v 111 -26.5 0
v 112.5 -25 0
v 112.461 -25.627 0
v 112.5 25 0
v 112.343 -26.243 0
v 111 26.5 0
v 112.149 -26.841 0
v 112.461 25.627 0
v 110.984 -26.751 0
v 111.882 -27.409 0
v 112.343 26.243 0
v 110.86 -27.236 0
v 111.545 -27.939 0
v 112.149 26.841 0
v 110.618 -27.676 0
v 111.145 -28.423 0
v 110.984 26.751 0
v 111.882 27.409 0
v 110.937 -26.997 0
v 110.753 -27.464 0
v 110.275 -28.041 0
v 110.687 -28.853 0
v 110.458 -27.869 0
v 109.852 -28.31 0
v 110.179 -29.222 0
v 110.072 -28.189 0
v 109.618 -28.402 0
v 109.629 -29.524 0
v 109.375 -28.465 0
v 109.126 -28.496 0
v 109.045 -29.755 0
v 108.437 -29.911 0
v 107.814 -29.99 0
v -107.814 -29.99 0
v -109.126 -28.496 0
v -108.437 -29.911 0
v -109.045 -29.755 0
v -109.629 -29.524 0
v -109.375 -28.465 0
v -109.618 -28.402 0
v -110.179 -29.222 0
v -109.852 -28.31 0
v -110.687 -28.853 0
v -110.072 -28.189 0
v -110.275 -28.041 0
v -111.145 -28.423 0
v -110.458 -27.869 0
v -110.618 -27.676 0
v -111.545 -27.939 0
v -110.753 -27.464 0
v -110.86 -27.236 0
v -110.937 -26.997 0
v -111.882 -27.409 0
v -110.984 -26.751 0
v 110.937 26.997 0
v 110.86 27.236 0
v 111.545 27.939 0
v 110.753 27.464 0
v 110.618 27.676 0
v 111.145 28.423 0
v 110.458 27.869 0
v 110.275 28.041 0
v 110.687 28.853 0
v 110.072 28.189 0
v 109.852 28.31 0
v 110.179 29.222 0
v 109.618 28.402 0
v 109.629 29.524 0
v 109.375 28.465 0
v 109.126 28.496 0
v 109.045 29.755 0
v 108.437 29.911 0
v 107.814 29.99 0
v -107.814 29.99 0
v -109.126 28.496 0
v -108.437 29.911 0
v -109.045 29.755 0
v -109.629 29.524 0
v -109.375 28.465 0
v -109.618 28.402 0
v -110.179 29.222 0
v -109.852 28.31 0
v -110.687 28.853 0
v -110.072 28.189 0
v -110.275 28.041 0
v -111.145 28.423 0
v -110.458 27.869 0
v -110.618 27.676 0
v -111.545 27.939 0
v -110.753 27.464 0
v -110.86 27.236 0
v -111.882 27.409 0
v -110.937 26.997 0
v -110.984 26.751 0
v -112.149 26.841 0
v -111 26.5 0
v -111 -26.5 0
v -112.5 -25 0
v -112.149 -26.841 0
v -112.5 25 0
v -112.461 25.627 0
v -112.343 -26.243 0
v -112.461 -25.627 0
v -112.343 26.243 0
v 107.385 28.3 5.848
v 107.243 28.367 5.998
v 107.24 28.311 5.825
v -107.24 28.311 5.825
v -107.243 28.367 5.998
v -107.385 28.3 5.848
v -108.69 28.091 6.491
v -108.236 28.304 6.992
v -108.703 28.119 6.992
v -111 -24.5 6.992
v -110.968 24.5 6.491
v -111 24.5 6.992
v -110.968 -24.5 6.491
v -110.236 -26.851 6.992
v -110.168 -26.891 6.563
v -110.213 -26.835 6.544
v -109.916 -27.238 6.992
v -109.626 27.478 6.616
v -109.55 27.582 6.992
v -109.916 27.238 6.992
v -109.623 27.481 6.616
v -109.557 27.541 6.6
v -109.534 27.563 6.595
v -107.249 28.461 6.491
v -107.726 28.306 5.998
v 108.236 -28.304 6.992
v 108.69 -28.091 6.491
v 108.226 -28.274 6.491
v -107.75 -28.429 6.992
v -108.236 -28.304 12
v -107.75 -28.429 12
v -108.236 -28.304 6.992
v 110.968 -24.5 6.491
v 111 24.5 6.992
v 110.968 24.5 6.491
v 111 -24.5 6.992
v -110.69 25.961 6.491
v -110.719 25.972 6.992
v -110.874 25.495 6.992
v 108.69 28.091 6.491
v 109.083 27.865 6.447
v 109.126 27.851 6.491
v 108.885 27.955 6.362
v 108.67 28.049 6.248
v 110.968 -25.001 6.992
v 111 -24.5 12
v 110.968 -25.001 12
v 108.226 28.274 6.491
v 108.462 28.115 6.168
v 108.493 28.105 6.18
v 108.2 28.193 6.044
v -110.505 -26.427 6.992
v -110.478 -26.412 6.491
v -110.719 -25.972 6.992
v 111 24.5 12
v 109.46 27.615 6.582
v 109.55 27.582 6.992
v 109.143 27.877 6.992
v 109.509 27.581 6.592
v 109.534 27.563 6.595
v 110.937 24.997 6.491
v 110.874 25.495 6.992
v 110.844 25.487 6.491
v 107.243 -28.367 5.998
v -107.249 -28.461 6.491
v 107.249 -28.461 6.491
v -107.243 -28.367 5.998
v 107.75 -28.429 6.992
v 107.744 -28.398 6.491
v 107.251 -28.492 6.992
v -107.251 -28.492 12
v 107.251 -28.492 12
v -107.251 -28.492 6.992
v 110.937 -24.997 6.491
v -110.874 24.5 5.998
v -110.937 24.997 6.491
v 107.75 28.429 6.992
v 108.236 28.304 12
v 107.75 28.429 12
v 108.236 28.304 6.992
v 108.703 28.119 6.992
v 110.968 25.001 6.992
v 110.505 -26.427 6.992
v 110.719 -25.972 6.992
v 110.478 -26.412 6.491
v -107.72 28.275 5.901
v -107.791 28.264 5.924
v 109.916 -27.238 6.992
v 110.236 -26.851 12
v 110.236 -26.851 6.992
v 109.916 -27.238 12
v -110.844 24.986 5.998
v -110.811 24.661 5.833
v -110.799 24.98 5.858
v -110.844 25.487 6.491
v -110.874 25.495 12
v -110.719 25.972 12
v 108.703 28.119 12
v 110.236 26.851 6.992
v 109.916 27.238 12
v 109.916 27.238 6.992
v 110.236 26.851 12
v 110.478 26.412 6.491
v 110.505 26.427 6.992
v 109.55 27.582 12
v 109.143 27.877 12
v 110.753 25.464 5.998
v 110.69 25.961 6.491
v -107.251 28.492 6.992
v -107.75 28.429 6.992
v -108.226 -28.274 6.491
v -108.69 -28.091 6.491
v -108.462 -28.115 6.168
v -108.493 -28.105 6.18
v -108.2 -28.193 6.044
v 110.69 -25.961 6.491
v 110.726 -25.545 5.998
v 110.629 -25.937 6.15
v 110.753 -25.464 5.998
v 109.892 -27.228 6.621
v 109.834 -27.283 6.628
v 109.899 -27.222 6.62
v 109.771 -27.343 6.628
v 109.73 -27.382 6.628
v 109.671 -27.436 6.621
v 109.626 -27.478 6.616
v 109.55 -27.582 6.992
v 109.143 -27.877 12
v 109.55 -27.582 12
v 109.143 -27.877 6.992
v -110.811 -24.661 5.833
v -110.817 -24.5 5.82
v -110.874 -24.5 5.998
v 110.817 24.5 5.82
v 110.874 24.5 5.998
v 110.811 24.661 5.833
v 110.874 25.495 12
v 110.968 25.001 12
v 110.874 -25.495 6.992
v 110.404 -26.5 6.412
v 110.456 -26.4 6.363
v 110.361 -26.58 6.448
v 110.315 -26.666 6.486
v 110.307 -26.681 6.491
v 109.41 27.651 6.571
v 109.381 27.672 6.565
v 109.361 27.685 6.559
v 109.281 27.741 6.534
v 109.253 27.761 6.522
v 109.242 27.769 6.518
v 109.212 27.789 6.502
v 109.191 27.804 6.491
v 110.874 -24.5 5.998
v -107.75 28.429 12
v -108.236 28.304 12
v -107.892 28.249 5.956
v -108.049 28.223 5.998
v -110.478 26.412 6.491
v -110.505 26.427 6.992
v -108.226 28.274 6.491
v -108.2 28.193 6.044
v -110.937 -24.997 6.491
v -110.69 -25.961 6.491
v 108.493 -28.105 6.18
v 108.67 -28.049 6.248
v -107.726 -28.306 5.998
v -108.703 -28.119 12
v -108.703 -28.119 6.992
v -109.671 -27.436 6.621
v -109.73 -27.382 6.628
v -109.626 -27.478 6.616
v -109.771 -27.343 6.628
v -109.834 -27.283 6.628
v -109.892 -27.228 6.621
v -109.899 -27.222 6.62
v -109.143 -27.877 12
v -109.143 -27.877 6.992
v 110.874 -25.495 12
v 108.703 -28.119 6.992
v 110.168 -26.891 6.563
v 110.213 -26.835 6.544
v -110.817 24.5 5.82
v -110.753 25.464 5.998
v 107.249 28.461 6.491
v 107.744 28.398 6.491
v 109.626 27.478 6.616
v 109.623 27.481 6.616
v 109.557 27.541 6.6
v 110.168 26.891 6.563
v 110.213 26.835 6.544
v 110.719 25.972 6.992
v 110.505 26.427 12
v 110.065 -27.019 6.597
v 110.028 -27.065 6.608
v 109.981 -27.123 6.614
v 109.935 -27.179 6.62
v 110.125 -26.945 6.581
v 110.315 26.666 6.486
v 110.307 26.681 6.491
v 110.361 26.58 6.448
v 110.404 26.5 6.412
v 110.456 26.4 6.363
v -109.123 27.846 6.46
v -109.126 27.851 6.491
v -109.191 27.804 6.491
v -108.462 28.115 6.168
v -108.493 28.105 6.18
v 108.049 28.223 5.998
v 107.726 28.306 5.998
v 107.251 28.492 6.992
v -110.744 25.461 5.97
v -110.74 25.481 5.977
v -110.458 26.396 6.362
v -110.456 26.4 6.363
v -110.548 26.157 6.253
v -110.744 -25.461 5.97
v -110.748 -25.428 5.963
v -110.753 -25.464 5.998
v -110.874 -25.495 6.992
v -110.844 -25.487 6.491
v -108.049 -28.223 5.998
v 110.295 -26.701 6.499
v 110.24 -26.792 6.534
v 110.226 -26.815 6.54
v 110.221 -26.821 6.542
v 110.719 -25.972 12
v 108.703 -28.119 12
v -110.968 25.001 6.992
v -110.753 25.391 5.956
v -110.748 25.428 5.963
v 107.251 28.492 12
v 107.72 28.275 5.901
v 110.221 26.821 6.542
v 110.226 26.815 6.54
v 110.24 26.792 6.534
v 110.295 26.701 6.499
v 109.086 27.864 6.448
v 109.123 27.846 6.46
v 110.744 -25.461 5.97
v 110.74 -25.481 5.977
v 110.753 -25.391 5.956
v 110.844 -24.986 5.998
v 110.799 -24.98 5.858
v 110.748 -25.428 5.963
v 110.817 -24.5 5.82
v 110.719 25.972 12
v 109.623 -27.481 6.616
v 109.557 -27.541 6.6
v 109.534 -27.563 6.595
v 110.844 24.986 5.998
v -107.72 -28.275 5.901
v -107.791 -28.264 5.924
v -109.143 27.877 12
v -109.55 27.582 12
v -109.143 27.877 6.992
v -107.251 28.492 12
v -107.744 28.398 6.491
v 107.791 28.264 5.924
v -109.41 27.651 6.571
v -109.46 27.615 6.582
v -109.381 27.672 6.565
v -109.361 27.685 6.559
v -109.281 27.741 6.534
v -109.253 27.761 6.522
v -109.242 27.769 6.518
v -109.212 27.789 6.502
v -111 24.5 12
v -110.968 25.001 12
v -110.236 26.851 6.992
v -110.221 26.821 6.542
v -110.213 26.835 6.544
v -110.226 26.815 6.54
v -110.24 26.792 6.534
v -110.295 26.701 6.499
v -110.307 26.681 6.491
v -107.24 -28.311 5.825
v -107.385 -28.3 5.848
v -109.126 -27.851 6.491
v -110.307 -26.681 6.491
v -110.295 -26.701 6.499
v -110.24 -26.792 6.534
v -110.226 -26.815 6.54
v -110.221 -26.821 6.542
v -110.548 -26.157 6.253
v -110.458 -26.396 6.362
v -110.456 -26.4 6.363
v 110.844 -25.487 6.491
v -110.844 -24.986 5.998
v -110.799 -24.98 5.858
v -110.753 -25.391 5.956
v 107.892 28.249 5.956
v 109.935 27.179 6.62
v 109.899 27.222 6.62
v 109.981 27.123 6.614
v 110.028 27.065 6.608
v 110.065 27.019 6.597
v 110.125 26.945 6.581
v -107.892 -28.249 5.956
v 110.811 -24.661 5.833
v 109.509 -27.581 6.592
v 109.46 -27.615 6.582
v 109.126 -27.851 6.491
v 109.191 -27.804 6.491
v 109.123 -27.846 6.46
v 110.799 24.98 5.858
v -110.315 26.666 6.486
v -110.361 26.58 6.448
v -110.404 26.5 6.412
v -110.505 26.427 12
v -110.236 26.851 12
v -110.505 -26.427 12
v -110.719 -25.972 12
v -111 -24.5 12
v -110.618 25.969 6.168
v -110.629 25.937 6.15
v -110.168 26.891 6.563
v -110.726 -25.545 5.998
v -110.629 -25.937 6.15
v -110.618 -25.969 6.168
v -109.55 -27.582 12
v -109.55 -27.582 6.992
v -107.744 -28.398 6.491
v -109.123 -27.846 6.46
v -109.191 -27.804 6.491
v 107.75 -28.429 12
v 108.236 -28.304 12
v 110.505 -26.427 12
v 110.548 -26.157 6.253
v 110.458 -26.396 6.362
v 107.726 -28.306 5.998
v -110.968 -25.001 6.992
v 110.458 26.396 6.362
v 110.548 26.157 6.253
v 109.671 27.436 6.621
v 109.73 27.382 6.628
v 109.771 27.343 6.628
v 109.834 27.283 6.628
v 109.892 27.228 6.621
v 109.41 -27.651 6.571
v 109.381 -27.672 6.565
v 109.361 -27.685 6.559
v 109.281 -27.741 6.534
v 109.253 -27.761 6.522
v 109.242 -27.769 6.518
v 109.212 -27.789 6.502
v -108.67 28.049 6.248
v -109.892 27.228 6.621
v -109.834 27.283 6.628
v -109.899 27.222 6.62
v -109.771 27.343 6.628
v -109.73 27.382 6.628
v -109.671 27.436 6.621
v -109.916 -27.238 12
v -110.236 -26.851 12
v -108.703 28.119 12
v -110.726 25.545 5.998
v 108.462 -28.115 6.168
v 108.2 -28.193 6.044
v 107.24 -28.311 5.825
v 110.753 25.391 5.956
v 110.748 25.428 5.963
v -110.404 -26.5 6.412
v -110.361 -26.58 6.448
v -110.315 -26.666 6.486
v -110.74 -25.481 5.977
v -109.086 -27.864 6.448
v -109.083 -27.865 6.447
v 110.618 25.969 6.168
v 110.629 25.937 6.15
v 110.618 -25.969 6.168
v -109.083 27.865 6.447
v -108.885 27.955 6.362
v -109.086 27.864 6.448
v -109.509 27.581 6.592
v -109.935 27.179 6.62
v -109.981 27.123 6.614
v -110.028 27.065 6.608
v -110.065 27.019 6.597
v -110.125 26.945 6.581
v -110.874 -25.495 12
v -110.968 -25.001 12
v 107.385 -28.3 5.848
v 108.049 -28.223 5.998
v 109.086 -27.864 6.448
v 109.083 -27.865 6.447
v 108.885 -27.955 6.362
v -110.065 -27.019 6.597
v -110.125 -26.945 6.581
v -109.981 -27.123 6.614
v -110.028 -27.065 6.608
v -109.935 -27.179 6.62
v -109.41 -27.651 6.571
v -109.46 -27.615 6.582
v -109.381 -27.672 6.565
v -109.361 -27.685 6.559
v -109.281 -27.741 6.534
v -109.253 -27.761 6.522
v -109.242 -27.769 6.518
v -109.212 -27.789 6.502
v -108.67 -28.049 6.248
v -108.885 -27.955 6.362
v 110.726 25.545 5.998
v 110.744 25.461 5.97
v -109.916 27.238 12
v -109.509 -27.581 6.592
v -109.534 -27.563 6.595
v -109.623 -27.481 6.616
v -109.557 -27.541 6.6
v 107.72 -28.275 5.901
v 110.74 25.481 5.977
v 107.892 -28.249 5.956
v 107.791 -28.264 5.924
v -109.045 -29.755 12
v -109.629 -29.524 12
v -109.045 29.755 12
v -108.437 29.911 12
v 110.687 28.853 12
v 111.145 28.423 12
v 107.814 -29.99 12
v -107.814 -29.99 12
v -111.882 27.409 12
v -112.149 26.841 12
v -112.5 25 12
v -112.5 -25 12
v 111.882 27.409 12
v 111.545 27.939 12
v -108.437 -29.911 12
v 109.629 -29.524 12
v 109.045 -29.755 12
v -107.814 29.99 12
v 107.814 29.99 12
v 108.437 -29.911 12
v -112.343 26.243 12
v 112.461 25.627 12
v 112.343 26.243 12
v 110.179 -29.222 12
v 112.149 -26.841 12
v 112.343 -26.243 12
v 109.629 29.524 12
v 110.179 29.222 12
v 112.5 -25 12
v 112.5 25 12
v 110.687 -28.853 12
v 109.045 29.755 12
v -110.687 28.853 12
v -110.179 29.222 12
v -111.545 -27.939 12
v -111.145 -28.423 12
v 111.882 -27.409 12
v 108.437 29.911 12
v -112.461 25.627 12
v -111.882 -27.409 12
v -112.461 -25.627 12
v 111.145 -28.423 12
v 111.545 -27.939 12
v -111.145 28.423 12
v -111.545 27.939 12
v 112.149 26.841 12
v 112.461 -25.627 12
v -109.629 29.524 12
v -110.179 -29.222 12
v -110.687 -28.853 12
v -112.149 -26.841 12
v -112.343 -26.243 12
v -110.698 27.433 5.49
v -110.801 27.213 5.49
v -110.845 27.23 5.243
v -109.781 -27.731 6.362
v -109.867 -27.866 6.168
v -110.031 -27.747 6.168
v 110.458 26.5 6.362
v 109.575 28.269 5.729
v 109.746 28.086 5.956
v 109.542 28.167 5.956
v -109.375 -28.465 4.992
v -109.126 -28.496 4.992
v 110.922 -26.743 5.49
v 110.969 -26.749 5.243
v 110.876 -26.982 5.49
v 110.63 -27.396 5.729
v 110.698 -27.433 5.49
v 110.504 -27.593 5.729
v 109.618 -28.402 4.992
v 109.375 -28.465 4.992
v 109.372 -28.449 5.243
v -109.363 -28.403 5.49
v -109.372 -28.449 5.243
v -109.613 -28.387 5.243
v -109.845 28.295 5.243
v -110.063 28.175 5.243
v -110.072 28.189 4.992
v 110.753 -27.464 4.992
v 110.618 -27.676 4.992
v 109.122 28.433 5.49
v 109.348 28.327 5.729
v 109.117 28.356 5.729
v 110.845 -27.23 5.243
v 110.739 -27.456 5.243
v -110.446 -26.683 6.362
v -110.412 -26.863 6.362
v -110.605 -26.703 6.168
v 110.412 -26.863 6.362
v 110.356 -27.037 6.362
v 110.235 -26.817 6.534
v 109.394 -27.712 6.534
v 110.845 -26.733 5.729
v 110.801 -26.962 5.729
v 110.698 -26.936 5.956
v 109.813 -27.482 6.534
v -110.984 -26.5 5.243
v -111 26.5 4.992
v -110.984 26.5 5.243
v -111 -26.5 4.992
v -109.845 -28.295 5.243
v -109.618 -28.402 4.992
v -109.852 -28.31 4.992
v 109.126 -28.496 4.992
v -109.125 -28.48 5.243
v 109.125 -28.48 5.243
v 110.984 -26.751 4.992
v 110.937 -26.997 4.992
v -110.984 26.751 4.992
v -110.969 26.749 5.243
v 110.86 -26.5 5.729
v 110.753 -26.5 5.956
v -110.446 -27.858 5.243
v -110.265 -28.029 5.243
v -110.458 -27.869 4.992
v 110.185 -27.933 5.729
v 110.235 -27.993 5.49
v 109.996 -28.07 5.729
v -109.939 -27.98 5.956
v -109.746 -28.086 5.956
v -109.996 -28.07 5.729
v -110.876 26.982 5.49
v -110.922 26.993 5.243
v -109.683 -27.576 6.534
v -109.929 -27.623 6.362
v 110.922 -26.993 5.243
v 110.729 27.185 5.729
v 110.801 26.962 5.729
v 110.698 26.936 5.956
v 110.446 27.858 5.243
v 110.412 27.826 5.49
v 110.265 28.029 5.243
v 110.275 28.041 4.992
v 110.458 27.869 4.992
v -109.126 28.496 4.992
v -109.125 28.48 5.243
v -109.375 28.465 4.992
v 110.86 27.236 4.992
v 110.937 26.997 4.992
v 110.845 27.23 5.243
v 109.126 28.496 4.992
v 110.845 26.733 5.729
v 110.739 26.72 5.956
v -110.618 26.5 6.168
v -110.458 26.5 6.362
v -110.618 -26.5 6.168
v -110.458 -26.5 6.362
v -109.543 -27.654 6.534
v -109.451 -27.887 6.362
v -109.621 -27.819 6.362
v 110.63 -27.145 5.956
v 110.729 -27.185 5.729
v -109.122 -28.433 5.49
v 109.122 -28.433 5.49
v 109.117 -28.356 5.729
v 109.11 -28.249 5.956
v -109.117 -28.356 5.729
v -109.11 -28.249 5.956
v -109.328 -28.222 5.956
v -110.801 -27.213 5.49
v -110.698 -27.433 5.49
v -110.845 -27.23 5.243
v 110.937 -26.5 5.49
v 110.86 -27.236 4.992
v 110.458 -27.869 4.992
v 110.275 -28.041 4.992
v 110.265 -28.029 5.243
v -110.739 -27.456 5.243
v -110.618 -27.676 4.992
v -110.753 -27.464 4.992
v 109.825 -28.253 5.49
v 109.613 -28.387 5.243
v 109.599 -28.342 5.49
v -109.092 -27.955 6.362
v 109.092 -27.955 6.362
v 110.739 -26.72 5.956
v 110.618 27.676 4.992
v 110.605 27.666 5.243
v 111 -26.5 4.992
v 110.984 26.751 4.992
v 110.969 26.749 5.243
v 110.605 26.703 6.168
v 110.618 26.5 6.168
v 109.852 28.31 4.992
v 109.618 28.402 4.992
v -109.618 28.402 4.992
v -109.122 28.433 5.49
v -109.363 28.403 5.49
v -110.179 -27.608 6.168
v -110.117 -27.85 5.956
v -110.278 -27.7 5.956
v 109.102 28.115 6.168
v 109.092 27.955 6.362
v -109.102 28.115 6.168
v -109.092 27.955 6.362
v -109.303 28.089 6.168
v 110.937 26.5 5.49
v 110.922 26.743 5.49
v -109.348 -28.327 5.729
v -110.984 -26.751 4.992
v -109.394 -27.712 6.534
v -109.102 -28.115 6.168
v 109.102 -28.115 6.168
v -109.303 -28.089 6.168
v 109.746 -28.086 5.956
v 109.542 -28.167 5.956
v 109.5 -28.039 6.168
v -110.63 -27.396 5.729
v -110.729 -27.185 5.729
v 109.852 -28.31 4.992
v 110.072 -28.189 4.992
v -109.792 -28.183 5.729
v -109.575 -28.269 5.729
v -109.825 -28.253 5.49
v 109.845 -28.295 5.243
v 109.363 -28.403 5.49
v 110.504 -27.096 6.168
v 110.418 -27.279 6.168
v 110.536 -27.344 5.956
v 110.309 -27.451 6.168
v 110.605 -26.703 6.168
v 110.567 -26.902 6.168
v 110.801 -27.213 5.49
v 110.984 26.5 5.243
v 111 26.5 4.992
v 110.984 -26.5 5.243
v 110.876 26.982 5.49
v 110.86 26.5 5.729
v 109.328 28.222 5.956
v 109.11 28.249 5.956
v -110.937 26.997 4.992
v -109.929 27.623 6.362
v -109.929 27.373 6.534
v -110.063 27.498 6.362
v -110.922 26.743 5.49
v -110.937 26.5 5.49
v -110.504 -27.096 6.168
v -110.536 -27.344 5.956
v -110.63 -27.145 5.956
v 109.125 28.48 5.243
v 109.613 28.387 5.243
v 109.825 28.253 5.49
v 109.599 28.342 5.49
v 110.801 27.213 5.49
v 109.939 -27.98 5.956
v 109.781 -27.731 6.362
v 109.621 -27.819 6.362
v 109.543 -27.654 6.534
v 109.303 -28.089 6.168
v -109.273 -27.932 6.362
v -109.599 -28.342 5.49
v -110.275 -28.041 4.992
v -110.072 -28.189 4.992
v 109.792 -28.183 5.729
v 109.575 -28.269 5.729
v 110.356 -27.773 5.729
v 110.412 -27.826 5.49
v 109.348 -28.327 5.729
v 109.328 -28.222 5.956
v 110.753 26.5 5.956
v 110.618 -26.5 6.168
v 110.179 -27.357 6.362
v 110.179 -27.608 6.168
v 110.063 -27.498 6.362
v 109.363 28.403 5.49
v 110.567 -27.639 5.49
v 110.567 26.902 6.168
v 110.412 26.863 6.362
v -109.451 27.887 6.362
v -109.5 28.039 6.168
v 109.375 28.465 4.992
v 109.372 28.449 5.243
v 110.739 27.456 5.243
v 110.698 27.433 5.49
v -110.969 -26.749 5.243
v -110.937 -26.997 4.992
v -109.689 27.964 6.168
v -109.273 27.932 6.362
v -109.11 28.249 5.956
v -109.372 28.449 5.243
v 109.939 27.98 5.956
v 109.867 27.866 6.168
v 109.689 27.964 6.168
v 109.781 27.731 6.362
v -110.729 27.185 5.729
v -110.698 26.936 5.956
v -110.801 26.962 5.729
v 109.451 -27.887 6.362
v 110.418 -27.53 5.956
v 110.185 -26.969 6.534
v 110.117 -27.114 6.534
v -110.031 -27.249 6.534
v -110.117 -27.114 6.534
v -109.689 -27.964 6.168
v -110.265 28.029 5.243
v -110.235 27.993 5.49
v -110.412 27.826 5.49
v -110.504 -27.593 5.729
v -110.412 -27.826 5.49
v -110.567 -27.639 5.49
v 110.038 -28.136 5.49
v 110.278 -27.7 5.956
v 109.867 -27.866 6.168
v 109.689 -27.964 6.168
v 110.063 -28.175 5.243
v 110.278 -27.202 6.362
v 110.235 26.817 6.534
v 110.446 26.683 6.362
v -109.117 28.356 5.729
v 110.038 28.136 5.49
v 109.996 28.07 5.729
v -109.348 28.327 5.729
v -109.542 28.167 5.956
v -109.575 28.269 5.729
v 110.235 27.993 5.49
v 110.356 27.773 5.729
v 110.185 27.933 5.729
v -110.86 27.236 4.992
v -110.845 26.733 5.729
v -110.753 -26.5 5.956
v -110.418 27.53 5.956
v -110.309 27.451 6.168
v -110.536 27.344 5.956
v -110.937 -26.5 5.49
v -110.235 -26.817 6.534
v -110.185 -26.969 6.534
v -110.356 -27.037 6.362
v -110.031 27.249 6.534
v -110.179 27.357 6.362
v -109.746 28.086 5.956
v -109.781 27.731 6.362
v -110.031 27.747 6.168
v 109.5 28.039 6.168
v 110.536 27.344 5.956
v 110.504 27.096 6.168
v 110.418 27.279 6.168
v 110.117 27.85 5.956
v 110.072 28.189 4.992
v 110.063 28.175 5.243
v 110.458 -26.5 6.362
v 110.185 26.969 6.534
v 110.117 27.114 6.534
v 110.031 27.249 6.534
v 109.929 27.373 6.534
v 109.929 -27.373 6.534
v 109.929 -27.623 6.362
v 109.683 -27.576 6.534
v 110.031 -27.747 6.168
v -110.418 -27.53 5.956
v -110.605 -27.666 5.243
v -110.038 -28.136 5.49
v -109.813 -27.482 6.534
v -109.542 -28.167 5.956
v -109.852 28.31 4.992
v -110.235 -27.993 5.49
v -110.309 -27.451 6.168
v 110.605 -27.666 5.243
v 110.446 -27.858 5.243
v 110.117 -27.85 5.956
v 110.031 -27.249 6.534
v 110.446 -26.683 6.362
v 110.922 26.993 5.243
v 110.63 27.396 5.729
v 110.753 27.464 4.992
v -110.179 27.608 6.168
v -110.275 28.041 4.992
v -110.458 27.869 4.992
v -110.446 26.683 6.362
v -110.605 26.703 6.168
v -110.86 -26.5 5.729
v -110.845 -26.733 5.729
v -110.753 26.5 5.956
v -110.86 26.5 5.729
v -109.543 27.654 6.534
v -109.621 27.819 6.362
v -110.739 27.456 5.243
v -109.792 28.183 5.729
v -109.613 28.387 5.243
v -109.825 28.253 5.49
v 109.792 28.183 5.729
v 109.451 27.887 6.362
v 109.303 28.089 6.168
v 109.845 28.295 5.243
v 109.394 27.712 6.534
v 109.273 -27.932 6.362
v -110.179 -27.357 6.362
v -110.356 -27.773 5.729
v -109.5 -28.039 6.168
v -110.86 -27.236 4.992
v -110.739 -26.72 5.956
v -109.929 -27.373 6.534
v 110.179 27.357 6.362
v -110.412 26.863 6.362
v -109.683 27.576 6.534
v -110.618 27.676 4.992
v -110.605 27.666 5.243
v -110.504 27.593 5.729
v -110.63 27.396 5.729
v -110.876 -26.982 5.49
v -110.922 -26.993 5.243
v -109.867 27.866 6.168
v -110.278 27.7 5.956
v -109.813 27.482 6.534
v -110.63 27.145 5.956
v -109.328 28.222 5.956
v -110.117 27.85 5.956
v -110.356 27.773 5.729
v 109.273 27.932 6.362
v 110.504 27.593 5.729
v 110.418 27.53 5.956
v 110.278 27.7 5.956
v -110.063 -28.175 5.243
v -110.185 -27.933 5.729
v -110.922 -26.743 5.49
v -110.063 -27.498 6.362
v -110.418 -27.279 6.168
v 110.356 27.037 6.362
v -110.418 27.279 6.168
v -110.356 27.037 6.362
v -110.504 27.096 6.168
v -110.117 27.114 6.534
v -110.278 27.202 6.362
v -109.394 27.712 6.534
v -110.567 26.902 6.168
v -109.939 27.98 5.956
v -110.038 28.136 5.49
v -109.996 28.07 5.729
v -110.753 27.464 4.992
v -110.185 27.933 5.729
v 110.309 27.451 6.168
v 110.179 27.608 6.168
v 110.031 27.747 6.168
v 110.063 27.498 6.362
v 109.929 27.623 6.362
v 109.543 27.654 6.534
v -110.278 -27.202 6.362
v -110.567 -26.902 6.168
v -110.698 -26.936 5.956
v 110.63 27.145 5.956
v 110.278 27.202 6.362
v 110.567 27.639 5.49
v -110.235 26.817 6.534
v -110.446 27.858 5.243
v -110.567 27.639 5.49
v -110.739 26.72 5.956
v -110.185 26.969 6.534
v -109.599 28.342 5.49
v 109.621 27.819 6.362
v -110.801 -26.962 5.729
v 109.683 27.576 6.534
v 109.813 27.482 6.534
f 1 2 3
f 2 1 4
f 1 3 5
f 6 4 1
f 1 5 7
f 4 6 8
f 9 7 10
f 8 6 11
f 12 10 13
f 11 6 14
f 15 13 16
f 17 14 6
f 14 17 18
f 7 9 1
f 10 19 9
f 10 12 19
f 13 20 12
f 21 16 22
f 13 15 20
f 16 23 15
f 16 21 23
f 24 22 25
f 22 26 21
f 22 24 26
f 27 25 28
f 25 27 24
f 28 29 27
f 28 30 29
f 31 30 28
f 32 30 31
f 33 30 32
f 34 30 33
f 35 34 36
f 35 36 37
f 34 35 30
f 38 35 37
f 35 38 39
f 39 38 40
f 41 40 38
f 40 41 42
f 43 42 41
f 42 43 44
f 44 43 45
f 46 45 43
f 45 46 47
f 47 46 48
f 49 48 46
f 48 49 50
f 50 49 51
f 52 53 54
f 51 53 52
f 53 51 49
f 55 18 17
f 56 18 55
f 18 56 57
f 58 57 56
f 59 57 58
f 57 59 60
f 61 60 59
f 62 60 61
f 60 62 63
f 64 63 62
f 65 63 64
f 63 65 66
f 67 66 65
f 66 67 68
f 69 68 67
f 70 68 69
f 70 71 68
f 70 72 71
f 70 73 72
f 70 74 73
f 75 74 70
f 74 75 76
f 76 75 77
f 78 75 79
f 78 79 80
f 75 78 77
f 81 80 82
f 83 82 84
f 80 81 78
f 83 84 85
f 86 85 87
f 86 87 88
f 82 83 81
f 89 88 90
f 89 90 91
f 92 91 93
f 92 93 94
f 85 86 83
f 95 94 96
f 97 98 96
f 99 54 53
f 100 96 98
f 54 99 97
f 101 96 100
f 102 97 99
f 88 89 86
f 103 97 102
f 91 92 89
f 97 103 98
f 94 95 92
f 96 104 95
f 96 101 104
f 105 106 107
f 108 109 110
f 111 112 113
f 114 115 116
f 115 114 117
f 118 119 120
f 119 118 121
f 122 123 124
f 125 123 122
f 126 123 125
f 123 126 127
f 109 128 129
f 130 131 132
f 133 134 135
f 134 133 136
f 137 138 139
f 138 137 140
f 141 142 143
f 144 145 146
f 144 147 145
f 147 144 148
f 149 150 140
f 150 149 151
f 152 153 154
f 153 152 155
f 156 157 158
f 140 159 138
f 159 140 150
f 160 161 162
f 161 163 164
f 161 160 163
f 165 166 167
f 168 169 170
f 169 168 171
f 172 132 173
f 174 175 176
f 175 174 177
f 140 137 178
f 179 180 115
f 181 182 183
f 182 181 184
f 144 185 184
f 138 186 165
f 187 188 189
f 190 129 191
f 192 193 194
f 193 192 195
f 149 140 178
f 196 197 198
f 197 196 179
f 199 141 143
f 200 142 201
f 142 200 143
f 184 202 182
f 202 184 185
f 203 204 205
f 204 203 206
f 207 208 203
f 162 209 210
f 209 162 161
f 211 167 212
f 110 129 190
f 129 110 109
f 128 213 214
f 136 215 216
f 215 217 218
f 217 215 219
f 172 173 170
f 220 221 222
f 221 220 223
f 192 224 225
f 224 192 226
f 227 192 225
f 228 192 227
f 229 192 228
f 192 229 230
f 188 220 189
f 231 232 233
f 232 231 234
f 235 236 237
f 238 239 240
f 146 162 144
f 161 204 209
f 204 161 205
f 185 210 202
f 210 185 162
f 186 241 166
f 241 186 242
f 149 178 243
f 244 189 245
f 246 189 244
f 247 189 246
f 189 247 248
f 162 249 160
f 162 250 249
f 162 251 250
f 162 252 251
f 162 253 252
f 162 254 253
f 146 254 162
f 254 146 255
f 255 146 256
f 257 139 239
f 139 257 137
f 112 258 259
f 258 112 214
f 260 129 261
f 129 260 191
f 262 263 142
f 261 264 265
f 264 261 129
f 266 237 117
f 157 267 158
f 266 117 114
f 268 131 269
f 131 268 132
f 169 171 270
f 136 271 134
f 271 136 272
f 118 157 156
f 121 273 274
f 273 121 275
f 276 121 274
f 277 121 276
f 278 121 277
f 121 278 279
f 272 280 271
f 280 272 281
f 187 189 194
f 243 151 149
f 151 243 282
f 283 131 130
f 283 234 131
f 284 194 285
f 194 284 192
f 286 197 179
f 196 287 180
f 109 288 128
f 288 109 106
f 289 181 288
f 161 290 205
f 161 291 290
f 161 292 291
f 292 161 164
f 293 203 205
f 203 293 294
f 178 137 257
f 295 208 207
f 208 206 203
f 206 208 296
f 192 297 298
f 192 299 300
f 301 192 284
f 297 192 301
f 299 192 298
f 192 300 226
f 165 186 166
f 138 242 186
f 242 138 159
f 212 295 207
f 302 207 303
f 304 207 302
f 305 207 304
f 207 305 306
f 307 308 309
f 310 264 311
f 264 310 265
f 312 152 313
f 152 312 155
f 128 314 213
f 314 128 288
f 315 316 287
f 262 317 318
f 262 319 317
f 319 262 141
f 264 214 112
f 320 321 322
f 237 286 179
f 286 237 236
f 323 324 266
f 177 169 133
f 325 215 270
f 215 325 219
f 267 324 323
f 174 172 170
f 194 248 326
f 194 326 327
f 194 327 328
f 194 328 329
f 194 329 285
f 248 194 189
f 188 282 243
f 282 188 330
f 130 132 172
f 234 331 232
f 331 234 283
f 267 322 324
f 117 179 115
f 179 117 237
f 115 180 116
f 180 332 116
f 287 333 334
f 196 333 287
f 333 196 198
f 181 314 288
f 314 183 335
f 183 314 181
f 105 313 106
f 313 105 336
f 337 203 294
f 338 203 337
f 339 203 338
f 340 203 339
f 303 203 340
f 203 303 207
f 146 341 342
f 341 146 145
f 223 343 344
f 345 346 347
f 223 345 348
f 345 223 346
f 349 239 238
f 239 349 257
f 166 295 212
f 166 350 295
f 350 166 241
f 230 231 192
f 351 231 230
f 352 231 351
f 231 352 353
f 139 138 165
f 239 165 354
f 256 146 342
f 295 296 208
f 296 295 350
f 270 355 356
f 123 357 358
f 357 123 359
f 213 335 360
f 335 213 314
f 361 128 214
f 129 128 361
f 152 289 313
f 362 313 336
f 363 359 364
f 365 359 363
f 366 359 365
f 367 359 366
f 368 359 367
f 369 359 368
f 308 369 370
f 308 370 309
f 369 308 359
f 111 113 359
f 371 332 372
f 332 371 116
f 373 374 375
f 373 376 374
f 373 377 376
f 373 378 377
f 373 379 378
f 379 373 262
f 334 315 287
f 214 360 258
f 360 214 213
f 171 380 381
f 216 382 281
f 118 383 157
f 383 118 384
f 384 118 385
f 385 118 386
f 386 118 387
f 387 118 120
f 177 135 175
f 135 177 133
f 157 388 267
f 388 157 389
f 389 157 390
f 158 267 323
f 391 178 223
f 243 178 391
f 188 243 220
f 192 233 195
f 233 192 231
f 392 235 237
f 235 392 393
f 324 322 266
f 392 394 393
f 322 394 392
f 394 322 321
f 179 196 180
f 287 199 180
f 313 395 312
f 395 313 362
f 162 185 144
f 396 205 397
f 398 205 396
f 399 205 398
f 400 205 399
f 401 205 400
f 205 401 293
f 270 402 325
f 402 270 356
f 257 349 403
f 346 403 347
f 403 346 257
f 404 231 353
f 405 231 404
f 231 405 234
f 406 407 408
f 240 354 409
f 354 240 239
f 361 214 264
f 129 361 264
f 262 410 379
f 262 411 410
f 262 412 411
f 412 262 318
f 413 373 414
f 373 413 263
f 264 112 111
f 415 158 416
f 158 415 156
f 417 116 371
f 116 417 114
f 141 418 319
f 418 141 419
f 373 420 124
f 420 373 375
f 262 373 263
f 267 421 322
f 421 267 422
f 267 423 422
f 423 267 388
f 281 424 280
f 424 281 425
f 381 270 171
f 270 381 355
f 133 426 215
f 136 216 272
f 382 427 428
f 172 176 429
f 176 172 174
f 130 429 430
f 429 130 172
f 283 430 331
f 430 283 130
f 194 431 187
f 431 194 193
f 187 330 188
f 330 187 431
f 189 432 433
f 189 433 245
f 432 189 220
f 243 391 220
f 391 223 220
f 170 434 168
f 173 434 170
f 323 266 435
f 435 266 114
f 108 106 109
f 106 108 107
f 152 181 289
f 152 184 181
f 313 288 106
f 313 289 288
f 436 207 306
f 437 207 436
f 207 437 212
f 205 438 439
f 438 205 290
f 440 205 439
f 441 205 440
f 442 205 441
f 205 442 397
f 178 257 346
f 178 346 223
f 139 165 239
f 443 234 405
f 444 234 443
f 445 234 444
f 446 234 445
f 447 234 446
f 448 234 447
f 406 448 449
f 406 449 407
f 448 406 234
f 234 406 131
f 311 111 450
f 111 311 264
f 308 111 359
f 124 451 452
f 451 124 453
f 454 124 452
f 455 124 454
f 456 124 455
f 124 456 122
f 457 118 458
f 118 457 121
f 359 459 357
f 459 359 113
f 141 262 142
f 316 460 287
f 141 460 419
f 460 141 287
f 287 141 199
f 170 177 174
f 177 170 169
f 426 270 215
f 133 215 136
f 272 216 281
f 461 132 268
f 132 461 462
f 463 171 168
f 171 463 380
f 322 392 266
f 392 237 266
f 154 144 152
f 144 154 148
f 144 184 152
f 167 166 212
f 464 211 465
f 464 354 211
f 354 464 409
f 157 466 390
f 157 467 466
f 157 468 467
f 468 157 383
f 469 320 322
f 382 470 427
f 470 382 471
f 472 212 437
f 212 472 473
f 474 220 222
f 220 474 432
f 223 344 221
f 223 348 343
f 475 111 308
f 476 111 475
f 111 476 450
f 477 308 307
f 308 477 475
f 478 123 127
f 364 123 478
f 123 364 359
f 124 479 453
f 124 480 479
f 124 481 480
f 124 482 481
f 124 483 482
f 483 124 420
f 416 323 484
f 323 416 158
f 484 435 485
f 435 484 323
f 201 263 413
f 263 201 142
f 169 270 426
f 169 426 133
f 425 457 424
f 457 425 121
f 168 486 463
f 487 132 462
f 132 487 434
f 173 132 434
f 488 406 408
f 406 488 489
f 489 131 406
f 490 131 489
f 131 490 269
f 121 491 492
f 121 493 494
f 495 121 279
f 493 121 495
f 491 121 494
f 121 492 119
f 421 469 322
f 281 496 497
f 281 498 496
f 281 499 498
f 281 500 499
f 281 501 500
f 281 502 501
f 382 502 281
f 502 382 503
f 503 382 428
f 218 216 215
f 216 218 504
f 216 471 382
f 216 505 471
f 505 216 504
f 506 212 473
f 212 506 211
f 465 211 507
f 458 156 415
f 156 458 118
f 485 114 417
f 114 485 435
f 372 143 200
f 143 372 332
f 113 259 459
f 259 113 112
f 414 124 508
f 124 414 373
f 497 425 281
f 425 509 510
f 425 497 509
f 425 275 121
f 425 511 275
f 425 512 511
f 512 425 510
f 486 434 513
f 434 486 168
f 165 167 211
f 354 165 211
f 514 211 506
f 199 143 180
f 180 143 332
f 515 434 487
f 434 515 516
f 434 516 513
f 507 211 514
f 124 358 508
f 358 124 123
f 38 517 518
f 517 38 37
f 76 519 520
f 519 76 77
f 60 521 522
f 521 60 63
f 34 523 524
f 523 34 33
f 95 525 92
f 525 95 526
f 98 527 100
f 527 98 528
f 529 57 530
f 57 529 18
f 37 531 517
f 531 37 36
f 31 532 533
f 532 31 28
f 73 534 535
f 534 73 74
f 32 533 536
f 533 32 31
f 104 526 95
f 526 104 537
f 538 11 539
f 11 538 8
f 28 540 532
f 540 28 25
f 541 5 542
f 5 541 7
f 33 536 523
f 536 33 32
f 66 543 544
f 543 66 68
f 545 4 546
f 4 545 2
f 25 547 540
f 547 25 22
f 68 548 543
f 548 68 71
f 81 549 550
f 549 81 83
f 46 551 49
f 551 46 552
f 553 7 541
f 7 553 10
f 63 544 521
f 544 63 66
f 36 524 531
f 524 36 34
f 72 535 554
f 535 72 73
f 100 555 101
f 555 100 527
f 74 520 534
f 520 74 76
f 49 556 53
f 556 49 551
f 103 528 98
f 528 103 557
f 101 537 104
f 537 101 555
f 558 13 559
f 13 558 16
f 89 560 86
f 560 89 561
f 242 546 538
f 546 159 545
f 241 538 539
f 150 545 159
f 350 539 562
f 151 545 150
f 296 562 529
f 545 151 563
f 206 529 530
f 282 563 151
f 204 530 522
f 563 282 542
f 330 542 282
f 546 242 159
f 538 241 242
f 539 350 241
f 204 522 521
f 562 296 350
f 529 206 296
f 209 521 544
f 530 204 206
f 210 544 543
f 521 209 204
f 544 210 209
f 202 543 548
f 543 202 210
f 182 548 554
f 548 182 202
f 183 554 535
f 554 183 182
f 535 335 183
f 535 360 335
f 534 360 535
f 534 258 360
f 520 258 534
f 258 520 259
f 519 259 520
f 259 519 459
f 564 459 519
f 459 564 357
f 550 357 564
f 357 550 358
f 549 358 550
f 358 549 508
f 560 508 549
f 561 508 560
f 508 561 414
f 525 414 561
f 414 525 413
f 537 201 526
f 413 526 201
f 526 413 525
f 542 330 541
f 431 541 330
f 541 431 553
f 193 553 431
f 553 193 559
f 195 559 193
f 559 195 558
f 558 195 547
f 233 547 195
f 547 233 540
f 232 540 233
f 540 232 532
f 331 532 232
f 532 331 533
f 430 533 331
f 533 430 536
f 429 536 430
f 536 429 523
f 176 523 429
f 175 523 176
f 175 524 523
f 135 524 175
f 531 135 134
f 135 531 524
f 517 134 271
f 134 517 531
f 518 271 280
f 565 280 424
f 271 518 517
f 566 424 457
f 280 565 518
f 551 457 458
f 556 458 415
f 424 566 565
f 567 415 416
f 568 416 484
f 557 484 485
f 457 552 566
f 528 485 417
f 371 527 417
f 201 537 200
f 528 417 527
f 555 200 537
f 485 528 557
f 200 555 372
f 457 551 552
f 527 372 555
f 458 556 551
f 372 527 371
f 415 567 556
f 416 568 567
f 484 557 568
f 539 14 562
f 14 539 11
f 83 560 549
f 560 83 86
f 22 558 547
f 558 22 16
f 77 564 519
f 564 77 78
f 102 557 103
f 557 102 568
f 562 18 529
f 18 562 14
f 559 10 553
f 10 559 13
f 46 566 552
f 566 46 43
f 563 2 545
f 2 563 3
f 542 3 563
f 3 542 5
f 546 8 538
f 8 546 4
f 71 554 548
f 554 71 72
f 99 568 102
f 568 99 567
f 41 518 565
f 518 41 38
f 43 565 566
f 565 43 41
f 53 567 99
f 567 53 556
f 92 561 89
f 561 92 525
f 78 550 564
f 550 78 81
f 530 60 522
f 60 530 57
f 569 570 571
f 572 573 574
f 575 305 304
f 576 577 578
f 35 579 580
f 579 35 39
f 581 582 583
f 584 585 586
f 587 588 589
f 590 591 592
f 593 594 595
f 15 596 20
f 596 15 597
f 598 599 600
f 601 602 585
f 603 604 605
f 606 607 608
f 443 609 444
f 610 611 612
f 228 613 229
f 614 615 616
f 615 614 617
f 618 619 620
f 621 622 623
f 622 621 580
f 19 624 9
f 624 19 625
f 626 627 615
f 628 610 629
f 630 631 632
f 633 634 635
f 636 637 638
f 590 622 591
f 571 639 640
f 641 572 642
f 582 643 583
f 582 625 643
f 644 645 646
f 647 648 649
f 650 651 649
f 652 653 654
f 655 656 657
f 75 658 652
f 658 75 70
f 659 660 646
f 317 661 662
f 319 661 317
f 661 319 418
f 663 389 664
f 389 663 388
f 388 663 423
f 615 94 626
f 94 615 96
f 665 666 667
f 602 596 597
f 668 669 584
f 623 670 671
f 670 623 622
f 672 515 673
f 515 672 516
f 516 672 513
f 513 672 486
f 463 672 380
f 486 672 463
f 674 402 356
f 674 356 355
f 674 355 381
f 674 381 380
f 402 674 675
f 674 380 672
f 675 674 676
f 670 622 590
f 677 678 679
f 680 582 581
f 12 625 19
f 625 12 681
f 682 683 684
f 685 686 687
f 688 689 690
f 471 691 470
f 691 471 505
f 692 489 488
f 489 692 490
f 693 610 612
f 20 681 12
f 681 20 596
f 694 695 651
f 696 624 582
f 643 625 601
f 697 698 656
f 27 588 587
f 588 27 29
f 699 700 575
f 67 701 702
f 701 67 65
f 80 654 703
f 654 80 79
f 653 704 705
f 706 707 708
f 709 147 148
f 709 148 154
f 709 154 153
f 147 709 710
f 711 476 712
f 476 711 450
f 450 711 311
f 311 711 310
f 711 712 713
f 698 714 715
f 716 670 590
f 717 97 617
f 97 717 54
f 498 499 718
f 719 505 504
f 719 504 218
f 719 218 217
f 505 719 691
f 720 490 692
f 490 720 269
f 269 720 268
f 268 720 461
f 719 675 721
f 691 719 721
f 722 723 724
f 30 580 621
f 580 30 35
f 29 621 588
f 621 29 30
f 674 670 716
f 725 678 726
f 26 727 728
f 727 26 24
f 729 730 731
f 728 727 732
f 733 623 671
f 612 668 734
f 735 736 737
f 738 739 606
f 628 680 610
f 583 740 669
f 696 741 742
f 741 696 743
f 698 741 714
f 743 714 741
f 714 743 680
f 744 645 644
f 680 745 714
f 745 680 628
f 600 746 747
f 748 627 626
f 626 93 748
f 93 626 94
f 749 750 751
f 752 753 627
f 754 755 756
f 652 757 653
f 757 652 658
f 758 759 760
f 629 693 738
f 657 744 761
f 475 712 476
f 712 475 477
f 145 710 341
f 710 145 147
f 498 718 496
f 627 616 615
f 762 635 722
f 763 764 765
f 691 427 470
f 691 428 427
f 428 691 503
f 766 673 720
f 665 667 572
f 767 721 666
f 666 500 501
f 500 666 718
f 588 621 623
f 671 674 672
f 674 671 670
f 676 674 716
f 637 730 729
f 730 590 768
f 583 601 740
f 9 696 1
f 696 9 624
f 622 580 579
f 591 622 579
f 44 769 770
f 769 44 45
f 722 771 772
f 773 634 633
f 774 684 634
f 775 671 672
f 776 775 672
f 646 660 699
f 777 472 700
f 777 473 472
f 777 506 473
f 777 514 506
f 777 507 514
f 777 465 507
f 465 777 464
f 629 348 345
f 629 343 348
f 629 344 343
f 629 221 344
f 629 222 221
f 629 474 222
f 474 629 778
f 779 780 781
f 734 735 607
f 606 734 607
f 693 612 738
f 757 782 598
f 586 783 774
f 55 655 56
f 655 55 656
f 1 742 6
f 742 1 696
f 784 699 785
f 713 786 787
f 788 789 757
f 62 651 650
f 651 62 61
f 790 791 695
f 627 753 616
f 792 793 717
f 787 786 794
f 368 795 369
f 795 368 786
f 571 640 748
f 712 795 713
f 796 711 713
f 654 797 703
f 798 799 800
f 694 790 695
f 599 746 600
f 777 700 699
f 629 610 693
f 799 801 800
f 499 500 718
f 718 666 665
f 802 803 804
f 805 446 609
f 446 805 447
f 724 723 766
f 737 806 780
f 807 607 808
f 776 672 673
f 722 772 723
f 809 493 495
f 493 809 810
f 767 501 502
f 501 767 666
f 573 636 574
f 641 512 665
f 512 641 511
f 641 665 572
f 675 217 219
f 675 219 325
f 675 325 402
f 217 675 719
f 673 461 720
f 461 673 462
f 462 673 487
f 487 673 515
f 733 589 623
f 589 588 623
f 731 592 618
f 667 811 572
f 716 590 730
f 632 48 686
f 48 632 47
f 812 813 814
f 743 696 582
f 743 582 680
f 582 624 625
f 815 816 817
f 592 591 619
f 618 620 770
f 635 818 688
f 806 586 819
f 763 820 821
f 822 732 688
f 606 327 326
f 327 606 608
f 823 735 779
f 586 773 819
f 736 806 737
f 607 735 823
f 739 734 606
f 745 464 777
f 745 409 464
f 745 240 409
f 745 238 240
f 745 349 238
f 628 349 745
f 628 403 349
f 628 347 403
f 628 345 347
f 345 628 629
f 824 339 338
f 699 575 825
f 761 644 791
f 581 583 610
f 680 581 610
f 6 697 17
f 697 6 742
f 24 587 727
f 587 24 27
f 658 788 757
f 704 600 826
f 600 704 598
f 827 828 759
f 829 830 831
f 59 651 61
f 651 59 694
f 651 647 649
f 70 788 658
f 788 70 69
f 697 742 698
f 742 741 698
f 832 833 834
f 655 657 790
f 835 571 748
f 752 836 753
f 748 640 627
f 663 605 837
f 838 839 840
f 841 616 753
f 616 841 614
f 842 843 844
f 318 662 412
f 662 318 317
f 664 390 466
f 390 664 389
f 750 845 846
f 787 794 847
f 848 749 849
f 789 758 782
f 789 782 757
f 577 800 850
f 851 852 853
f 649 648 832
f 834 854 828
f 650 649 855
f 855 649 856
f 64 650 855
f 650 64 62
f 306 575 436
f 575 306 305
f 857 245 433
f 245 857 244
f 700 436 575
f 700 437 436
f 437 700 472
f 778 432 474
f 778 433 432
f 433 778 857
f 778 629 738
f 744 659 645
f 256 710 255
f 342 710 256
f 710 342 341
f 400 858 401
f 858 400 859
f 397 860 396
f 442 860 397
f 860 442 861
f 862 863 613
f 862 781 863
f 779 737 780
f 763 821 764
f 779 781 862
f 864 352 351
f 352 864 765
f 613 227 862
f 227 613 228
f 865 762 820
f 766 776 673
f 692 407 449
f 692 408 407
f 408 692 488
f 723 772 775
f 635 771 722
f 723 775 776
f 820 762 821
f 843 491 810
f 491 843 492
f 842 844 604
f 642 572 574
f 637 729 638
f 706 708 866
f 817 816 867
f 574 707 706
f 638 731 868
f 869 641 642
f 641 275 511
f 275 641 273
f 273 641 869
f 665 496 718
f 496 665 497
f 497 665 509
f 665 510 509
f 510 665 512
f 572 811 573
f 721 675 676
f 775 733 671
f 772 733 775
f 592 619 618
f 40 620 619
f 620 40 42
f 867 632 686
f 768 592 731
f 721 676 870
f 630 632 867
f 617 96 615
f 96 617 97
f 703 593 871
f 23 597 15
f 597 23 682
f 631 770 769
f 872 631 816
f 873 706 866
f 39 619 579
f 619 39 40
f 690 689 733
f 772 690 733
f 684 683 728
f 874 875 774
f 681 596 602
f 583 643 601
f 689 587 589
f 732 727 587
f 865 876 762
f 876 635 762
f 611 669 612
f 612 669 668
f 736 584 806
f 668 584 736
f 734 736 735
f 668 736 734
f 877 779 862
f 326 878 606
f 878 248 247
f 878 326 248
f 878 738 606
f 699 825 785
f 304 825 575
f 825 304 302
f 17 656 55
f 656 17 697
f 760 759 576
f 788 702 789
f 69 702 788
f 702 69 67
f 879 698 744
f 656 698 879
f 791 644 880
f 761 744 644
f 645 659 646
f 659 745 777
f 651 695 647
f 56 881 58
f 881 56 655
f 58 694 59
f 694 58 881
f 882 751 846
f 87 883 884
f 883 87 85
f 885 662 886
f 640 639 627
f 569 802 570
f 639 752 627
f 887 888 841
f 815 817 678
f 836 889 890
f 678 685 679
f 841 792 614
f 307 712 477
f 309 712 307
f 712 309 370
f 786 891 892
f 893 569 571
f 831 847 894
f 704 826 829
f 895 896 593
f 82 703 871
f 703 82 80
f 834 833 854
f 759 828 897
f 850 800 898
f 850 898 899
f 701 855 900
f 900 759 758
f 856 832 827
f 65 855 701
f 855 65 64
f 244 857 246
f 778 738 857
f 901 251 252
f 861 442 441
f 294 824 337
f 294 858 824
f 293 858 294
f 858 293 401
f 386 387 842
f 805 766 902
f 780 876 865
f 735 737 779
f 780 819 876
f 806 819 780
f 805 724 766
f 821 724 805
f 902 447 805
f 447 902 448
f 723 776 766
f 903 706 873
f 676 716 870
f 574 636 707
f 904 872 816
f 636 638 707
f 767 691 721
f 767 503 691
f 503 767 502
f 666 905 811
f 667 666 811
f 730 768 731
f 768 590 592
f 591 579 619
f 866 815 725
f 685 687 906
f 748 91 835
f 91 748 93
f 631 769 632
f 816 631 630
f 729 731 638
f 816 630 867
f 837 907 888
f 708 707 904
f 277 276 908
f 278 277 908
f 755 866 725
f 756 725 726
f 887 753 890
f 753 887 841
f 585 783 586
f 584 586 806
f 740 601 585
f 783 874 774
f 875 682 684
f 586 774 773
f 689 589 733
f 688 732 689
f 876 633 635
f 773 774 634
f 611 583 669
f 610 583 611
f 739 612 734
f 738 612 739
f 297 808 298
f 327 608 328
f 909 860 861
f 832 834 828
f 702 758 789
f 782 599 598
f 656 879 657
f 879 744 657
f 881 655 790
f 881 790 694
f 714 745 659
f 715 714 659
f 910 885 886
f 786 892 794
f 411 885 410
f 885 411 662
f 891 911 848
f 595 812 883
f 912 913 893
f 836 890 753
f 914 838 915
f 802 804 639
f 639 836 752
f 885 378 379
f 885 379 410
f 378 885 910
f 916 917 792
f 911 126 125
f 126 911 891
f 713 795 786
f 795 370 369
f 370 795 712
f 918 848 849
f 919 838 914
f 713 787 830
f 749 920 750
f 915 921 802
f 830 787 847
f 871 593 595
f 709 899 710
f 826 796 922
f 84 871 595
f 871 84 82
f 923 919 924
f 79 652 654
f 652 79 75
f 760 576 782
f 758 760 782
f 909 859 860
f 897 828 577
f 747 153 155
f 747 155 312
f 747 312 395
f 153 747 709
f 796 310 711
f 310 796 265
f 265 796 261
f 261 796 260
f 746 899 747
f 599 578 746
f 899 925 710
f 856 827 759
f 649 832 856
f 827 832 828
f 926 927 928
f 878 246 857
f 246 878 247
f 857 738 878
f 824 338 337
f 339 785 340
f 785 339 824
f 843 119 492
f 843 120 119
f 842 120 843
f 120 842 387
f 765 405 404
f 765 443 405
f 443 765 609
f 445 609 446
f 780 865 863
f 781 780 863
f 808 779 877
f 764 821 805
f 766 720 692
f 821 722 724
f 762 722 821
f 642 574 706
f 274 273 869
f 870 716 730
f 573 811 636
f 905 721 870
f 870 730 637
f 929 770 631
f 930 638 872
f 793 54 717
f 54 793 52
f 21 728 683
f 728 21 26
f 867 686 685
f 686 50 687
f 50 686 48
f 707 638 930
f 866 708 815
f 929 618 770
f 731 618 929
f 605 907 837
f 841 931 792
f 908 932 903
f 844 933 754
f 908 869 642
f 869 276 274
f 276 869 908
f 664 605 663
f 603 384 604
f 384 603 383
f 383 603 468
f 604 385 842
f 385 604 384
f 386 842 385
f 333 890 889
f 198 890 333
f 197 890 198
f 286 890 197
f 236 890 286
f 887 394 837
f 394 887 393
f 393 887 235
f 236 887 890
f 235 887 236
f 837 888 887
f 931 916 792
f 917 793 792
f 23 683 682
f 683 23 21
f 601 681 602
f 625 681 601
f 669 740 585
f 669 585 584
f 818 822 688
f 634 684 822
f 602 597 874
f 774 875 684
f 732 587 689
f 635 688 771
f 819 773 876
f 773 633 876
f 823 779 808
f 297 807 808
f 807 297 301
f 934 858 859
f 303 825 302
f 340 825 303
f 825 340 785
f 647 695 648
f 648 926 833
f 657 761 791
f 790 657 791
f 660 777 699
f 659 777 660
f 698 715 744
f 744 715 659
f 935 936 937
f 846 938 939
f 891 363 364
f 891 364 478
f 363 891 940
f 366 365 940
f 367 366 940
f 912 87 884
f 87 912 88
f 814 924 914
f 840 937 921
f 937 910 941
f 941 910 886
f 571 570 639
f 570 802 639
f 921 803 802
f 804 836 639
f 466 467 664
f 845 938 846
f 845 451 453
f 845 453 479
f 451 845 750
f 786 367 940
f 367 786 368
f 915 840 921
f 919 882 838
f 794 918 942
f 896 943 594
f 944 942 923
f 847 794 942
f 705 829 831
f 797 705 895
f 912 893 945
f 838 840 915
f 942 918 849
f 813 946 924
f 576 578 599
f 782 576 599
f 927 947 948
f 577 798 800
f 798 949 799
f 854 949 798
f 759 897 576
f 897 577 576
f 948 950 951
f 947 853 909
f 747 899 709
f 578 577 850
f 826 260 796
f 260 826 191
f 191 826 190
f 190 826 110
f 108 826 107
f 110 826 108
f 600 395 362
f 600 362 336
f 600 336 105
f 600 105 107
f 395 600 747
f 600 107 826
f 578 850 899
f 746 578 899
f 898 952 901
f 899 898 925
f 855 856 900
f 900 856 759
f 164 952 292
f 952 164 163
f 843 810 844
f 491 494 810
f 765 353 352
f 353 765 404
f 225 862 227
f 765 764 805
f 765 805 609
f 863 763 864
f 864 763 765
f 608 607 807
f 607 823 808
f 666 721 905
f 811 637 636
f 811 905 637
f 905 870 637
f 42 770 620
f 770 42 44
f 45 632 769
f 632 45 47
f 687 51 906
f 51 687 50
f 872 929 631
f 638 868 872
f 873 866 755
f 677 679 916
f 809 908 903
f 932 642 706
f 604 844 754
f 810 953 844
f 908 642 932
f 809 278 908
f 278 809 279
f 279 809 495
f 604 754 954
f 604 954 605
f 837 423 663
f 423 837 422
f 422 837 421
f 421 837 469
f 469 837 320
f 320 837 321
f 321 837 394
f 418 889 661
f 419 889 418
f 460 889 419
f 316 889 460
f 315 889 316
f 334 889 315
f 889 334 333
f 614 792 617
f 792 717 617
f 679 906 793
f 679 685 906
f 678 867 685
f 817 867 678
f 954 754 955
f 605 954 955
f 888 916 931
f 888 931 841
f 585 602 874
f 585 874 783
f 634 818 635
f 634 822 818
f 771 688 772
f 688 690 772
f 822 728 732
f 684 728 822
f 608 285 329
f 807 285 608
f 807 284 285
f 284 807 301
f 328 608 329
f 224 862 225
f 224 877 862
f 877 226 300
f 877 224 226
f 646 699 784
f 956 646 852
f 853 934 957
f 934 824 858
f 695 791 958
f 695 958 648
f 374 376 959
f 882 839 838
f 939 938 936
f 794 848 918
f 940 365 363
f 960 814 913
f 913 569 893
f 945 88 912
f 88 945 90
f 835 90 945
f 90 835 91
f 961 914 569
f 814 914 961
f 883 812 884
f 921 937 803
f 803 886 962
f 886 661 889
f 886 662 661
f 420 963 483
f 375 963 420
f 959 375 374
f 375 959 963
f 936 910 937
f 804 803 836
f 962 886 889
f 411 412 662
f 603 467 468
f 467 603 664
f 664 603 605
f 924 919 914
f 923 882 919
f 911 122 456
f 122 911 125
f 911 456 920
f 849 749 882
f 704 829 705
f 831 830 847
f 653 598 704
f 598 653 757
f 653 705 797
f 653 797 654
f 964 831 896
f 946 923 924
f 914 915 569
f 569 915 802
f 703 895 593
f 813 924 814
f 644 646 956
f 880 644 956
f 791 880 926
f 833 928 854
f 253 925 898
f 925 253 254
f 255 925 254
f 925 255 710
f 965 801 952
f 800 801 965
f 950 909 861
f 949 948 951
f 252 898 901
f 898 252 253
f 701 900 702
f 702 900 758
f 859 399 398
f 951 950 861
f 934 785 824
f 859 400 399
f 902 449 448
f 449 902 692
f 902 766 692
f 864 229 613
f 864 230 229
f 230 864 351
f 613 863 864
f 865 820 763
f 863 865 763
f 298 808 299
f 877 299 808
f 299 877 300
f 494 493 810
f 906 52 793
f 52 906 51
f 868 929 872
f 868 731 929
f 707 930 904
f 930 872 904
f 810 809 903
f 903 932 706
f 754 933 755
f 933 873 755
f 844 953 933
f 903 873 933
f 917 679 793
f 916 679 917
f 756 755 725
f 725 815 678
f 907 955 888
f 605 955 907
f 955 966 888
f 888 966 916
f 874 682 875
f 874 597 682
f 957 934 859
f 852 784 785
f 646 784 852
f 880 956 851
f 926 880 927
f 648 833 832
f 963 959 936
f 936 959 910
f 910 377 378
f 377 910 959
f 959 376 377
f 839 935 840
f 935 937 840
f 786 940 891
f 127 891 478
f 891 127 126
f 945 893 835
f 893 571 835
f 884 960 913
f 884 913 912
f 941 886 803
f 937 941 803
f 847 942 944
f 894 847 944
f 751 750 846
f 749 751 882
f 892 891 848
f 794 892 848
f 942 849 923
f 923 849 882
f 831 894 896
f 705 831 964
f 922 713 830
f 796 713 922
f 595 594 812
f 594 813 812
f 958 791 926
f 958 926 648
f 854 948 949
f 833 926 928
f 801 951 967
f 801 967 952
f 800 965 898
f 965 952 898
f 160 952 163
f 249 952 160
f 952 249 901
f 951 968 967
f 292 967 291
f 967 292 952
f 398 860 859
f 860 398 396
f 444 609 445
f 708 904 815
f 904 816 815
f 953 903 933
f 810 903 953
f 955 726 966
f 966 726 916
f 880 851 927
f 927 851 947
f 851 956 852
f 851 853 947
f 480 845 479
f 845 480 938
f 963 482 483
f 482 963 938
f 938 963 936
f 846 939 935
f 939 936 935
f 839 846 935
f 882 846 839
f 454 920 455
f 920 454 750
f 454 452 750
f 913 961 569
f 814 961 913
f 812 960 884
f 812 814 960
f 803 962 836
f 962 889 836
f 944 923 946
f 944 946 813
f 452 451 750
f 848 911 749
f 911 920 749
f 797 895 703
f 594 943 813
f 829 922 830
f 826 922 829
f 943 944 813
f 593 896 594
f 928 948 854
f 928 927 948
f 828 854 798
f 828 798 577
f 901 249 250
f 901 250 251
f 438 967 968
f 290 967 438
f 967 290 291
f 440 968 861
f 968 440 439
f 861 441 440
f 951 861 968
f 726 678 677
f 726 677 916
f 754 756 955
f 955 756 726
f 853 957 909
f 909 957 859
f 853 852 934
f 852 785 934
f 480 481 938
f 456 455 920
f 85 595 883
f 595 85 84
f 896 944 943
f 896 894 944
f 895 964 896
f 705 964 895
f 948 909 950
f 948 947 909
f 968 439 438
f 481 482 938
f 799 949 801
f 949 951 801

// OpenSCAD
$fn = 50;


difference() {
	difference() {
		union() {
			hull() {
				translate(v = [-107.5000000000, 25.0000000000, 0]) {
					cylinder(h = 12, r = 5);
				}
				translate(v = [107.5000000000, 25.0000000000, 0]) {
					cylinder(h = 12, r = 5);
				}
				translate(v = [-107.5000000000, -25.0000000000, 0]) {
					cylinder(h = 12, r = 5);
				}
				translate(v = [107.5000000000, -25.0000000000, 0]) {
					cylinder(h = 12, r = 5);
				}
			}
		}
		union() {
			translate(v = [-105.0000000000, -22.5000000000, 3]) {
				rotate(a = [0, 0, 0]) {
					difference() {
						union() {
							translate(v = [0, 0, -3.0000000000]) {
								cylinder(h = 3, r = 1.5000000000);
							}
							translate(v = [0, 0, -1.9000000000]) {
								cylinder(h = 1.9000000000, r1 = 1.8000000000, r2 = 3.6000000000);
							}
							cylinder(h = 250, r = 3.6000000000);
							translate(v = [0, 0, -3.0000000000]) {
								cylinder(h = 3, r = 1.8000000000);
							}
							translate(v = [0, 0, -3.0000000000]) {
								cylinder(h = 3, r = 1.5000000000);
							}
						}
						union();
					}
				}
			}
			translate(v = [105.0000000000, -22.5000000000, 3]) {
				rotate(a = [0, 0, 0]) {
					difference() {
						union() {
							translate(v = [0, 0, -3.0000000000]) {
								cylinder(h = 3, r = 1.5000000000);
							}
							translate(v = [0, 0, -1.9000000000]) {
								cylinder(h = 1.9000000000, r1 = 1.8000000000, r2 = 3.6000000000);
							}
							cylinder(h = 250, r = 3.6000000000);
							translate(v = [0, 0, -3.0000000000]) {
								cylinder(h = 3, r = 1.8000000000);
							}
							translate(v = [0, 0, -3.0000000000]) {
								cylinder(h = 3, r = 1.5000000000);
							}
						}
						union();
					}
				}
			}
			translate(v = [-105.0000000000, 22.5000000000, 3]) {
				rotate(a = [0, 0, 0]) {
					difference() {
						union() {
							translate(v = [0, 0, -3.0000000000]) {
								cylinder(h = 3, r = 1.5000000000);
							}
							translate(v = [0, 0, -1.9000000000]) {
								cylinder(h = 1.9000000000, r1 = 1.8000000000, r2 = 3.6000000000);
							}
							cylinder(h = 250, r = 3.6000000000);
							translate(v = [0, 0, -3.0000000000]) {
								cylinder(h = 3, r = 1.8000000000);
							}
							translate(v = [0, 0, -3.0000000000]) {
								cylinder(h = 3, r = 1.5000000000);
							}
						}
						union();
					}
				}
			}
			translate(v = [105.0000000000, 22.5000000000, 3]) {
				rotate(a = [0, 0, 0]) {
					difference() {
						union() {
							translate(v = [0, 0, -3.0000000000]) {
								cylinder(h = 3, r = 1.5000000000);
							}
							translate(v = [0, 0, -1.9000000000]) {
								cylinder(h = 1.9000000000, r1 = 1.8000000000, r2 = 3.6000000000);
							}
							cylinder(h = 250, r = 3.6000000000);
							translate(v = [0, 0, -3.0000000000]) {
								cylinder(h = 3, r = 1.8000000000);
							}
							translate(v = [0, 0, -3.0000000000]) {
								cylinder(h = 3, r = 1.5000000000);
							}
						}
						union();
					}
				}
			}
			translate(v = [0, 0, 2.9925000000]) {
				hull() {
					union() {
						translate(v = [-107.0000000000, 24.5000000000, 4]) {
							cylinder(h = 49, r = 4);
						}
						translate(v = [-107.0000000000, 24.5000000000, 4]) {
							sphere(r = 4);
						}
						translate(v = [-107.0000000000, 24.5000000000, 53]) {
							sphere(r = 4);
						}
					}
					union() {
						translate(v = [107.0000000000, 24.5000000000, 4]) {
							cylinder(h = 49, r = 4);
						}
						translate(v = [107.0000000000, 24.5000000000, 4]) {
							sphere(r = 4);
						}
						translate(v = [107.0000000000, 24.5000000000, 53]) {
							sphere(r = 4);
						}
					}
					union() {
						translate(v = [-107.0000000000, -24.5000000000, 4]) {
							cylinder(h = 49, r = 4);
						}
						translate(v = [-107.0000000000, -24.5000000000, 4]) {
							sphere(r = 4);
						}
						translate(v = [-107.0000000000, -24.5000000000, 53]) {
							sphere(r = 4);
						}
					}
					union() {
						translate(v = [107.0000000000, -24.5000000000, 4]) {
							cylinder(h = 49, r = 4);
						}
						translate(v = [107.0000000000, -24.5000000000, 4]) {
							sphere(r = 4);
						}
						translate(v = [107.0000000000, -24.5000000000, 53]) {
							sphere(r = 4);
						}
					}
				}
			}
		}
	}
	union() {
		translate(v = [0, 0, 2.9925000000]) {
			hull() {
				union() {
					translate(v = [-109.0000000000, 26.5000000000, 2]) {
						cylinder(h = -7, r = 2);
					}
					translate(v = [-109.0000000000, 26.5000000000, 2]) {
						sphere(r = 2);
					}
					translate(v = [-109.0000000000, 26.5000000000, -5]) {
						sphere(r = 2);
					}
				}
				union() {
					translate(v = [109.0000000000, 26.5000000000, 2]) {
						cylinder(h = -7, r = 2);
					}
					translate(v = [109.0000000000, 26.5000000000, 2]) {
						sphere(r = 2);
					}
					translate(v = [109.0000000000, 26.5000000000, -5]) {
						sphere(r = 2);
					}
				}
				union() {
					translate(v = [-109.0000000000, -26.5000000000, 2]) {
						cylinder(h = -7, r = 2);
					}
					translate(v = [-109.0000000000, -26.5000000000, 2]) {
						sphere(r = 2);
					}
					translate(v = [-109.0000000000, -26.5000000000, -5]) {
						sphere(r = 2);
					}
				}
				union() {
					translate(v = [109.0000000000, -26.5000000000, 2]) {
						cylinder(h = -7, r = 2);
					}
					translate(v = [109.0000000000, -26.5000000000, 2]) {
						sphere(r = 2);
					}
					translate(v = [109.0000000000, -26.5000000000, -5]) {
						sphere(r = 2);
					}
				}
			}
		}
	}
}
